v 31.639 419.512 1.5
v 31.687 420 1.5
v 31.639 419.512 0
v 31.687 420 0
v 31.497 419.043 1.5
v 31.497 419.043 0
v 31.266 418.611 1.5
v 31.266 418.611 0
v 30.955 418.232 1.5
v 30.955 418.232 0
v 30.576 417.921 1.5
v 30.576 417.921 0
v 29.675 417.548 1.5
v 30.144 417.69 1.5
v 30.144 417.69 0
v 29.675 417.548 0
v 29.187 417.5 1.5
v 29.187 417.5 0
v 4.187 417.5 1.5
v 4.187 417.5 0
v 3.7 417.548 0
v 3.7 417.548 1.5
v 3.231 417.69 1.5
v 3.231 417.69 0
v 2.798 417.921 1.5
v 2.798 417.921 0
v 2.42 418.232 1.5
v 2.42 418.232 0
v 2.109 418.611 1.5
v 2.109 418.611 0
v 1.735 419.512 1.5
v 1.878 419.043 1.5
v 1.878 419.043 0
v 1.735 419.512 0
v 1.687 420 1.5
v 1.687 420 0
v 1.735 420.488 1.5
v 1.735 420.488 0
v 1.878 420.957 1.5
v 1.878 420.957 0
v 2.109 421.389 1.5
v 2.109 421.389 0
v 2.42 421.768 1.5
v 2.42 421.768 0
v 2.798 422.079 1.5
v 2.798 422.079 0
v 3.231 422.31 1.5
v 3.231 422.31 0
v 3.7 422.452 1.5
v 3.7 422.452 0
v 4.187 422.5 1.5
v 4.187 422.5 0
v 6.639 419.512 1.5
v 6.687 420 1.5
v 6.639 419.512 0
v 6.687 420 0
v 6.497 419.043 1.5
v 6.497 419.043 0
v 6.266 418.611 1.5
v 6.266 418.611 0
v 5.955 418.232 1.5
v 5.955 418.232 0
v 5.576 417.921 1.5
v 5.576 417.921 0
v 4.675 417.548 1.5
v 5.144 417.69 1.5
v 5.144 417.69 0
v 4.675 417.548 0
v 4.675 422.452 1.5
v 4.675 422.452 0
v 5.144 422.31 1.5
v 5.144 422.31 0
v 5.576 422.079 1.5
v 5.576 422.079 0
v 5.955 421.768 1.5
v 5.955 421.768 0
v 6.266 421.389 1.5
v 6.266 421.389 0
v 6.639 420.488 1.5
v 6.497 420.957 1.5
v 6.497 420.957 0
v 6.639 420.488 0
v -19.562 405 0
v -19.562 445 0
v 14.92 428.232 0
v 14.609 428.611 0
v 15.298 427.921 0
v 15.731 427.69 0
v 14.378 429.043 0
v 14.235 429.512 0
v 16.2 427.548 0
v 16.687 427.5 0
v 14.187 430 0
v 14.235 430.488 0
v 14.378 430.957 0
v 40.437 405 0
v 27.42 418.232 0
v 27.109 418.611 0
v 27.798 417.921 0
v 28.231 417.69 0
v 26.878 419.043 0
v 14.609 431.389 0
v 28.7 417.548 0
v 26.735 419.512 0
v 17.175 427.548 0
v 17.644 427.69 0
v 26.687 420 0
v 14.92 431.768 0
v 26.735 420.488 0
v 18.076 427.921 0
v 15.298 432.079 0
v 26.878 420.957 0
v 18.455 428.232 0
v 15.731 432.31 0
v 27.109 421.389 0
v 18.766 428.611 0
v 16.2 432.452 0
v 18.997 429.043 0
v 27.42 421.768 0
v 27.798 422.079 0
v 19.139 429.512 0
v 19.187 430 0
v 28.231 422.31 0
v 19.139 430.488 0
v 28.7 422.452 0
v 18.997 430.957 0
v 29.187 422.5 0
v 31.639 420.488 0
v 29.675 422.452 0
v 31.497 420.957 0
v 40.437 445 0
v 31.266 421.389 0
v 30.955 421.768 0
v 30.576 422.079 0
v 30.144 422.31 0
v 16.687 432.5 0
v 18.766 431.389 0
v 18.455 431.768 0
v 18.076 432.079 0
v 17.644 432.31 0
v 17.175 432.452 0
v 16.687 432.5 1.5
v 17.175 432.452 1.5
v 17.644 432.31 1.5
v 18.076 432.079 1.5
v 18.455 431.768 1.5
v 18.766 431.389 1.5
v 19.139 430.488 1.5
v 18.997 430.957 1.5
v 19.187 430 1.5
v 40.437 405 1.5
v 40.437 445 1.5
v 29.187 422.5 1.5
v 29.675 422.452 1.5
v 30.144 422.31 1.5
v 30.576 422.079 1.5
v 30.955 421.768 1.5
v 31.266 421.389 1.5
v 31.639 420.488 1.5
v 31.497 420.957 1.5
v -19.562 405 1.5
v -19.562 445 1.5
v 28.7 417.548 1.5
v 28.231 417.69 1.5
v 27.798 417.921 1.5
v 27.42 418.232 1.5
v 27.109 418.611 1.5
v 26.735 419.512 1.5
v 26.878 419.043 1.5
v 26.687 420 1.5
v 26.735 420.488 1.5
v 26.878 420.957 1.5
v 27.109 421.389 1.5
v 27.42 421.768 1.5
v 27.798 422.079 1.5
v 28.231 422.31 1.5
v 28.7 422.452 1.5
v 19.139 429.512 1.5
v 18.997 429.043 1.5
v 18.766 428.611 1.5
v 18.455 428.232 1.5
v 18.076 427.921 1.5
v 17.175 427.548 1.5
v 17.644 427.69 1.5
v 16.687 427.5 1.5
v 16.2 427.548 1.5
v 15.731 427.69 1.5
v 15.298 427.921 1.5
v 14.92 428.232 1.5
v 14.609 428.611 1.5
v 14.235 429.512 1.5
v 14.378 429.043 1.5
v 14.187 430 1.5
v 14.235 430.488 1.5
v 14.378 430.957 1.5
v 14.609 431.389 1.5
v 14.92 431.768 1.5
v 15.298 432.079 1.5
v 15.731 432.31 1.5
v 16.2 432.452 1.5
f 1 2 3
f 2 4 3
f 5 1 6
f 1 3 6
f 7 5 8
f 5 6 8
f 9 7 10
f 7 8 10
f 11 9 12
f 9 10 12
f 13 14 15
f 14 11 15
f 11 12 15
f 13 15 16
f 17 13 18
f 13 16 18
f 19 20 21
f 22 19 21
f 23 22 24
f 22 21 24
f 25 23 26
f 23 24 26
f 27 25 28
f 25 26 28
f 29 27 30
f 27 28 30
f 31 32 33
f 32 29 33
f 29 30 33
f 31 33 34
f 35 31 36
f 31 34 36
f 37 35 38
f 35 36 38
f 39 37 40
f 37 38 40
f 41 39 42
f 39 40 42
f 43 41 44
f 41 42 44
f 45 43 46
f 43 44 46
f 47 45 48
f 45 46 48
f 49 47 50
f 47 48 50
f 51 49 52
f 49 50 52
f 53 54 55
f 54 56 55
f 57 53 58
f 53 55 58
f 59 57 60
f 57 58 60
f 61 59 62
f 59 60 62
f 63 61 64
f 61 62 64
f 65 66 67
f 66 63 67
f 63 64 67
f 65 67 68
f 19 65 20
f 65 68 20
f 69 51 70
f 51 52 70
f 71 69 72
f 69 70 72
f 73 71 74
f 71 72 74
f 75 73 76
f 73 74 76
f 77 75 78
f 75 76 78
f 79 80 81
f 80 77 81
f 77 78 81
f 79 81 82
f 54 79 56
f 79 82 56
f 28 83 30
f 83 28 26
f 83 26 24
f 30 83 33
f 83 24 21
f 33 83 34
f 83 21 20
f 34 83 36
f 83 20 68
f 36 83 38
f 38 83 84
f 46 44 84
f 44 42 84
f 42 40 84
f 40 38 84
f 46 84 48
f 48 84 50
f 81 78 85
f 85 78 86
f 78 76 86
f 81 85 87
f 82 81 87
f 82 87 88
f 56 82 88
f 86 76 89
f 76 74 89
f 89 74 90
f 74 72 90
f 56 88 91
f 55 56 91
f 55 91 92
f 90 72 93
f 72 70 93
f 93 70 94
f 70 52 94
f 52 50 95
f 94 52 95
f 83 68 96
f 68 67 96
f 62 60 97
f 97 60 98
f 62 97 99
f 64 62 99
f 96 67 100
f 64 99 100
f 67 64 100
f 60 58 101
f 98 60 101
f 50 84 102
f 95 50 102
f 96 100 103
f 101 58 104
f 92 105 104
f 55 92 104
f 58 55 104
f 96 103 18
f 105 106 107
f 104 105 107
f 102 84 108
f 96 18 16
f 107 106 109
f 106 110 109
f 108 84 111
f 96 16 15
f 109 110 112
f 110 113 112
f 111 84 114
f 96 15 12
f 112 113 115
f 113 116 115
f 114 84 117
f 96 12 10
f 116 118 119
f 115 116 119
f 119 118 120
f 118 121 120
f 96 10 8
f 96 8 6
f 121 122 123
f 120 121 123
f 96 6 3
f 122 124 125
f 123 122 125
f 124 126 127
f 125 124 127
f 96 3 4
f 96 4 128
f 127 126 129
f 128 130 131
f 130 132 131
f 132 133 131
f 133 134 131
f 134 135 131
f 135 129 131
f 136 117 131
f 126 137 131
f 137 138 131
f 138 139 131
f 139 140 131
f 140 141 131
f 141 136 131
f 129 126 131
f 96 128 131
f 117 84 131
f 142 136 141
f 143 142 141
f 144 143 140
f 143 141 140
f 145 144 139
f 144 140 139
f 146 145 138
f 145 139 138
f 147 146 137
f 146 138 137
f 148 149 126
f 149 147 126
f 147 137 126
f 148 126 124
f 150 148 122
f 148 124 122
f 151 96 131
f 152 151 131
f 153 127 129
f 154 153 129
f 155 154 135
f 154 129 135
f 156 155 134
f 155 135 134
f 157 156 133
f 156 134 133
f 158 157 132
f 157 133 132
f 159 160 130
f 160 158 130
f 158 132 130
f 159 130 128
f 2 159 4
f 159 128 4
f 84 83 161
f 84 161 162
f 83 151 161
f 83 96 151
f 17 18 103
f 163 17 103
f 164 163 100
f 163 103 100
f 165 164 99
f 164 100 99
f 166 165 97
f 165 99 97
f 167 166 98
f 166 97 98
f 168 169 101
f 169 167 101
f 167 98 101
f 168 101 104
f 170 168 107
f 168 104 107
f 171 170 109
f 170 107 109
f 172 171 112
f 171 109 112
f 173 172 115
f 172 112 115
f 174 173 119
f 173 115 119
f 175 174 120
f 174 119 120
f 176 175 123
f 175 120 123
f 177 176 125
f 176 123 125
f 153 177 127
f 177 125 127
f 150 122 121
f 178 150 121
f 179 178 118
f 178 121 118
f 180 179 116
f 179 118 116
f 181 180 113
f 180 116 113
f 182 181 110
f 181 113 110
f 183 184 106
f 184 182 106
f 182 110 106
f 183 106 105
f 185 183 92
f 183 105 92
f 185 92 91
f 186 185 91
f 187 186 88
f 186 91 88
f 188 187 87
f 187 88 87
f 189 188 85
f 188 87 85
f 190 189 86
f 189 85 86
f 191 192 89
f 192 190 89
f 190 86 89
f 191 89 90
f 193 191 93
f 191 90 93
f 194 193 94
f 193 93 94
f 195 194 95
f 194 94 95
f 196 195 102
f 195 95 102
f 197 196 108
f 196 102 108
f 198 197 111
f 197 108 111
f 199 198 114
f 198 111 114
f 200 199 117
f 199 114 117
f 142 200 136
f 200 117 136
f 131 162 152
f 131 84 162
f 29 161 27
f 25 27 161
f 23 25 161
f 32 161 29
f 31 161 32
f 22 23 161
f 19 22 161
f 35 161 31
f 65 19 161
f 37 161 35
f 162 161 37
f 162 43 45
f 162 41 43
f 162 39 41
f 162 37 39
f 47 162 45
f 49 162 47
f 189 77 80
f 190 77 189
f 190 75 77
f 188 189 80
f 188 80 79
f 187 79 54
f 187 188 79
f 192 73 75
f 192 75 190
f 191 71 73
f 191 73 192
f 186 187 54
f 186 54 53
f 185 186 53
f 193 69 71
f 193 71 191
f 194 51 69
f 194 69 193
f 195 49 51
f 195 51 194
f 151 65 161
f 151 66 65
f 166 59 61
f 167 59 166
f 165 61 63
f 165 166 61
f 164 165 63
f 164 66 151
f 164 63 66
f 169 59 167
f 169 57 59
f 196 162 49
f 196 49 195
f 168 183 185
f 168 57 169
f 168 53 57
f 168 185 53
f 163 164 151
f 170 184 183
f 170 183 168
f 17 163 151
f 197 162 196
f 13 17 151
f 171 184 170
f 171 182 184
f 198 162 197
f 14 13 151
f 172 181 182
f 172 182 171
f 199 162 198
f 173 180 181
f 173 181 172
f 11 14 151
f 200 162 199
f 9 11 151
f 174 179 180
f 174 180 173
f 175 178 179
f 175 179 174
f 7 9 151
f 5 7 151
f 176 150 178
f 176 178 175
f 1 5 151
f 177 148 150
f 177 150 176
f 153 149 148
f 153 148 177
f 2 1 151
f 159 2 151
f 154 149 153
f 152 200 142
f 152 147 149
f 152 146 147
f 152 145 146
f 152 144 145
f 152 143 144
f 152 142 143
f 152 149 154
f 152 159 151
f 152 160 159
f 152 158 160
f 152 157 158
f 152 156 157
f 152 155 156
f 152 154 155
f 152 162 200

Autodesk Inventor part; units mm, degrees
ref_plane "YZ Plane" through (0, 0, 0) normal (1, 0, 0) x (0, 1, 0)
ref_plane "XZ Plane" through (0, 0, 0) normal (0, 1, 0) x (-1, 0, 0)
ref_plane "XY Plane" through (0, 0, 0) normal (0, 0, 1) x (1, 0, 0)
sketch "Sketch1" plane through (0, 0, 0) normal (0, 0, 1) x (1, 0, 0)
  line L0 (-19.5625, -111.2599) -> (-19.5625, 1344.9999)
  line L1 (40.4374, -111.2599) -> (40.4374, 1344.9999)
  line L2 (14.1874, 432.5) -> (19.1874, 432.5)
  line L3 (19.1874, 427.5) -> (14.1874, 427.5)
  line L4 (26.6874, 422.5) -> (31.6874, 422.5)
  line L5 (31.6874, 417.5) -> (26.6874, 417.5)
  line L6 (1.6874, 422.5) -> (6.6874, 422.5)
  line L7 (6.6874, 417.5) -> (1.6874, 417.5)
  line L8 (4.1874, 417.5) -> (4.1874, 422.5) construction
  line L9 (16.6874, 427.5) -> (16.6874, 432.5) construction
  line L10 (29.1874, 417.5) -> (29.1874, 422.5) construction
  circle A0 centre (4.1874, 420) radius 2.5
  circle A1 centre (16.6874, 430) radius 2.5
  circle A2 centre (29.1874, 420) radius 2.5
  line L11 (40.4374, 405) -> (-19.5625, 405)
  line L12 (-19.5625, 405) -> (-19.5625, 445)
  line L13 (-19.5625, 445) -> (40.4374, 445)
  line L14 (40.4374, 445) -> (40.4374, 405)
  point P0 (0, 0)
  dimension "d0" = 15
  dimension "d1" = 15
extrude "Plate1" add sketch "Sketch1" along normal blind 1.5
equation "\"BendRadius\" = Thickness"
equation "\"BendReliefWidth\" = Thickness"
equation "\"BendReliefDepth\" = 0.5 * Thickness"
equation "\"CornerReliefSize\" = 4 * Thickness"
equation "\"MinimumRemnant\" = 2 * Thickness"
equation "\"TransitionRadius\" = BendRadius"
equation "\"JacobiRadiusSize\" = BendRadius"
equation "\"GapSize\" = Thickness"
equation "\"d2\" = BendRadius"
equation "\"Thickness\" = 1.5"
properties part number "gabarito-porta-cabos" material "Wood (Oak)"
